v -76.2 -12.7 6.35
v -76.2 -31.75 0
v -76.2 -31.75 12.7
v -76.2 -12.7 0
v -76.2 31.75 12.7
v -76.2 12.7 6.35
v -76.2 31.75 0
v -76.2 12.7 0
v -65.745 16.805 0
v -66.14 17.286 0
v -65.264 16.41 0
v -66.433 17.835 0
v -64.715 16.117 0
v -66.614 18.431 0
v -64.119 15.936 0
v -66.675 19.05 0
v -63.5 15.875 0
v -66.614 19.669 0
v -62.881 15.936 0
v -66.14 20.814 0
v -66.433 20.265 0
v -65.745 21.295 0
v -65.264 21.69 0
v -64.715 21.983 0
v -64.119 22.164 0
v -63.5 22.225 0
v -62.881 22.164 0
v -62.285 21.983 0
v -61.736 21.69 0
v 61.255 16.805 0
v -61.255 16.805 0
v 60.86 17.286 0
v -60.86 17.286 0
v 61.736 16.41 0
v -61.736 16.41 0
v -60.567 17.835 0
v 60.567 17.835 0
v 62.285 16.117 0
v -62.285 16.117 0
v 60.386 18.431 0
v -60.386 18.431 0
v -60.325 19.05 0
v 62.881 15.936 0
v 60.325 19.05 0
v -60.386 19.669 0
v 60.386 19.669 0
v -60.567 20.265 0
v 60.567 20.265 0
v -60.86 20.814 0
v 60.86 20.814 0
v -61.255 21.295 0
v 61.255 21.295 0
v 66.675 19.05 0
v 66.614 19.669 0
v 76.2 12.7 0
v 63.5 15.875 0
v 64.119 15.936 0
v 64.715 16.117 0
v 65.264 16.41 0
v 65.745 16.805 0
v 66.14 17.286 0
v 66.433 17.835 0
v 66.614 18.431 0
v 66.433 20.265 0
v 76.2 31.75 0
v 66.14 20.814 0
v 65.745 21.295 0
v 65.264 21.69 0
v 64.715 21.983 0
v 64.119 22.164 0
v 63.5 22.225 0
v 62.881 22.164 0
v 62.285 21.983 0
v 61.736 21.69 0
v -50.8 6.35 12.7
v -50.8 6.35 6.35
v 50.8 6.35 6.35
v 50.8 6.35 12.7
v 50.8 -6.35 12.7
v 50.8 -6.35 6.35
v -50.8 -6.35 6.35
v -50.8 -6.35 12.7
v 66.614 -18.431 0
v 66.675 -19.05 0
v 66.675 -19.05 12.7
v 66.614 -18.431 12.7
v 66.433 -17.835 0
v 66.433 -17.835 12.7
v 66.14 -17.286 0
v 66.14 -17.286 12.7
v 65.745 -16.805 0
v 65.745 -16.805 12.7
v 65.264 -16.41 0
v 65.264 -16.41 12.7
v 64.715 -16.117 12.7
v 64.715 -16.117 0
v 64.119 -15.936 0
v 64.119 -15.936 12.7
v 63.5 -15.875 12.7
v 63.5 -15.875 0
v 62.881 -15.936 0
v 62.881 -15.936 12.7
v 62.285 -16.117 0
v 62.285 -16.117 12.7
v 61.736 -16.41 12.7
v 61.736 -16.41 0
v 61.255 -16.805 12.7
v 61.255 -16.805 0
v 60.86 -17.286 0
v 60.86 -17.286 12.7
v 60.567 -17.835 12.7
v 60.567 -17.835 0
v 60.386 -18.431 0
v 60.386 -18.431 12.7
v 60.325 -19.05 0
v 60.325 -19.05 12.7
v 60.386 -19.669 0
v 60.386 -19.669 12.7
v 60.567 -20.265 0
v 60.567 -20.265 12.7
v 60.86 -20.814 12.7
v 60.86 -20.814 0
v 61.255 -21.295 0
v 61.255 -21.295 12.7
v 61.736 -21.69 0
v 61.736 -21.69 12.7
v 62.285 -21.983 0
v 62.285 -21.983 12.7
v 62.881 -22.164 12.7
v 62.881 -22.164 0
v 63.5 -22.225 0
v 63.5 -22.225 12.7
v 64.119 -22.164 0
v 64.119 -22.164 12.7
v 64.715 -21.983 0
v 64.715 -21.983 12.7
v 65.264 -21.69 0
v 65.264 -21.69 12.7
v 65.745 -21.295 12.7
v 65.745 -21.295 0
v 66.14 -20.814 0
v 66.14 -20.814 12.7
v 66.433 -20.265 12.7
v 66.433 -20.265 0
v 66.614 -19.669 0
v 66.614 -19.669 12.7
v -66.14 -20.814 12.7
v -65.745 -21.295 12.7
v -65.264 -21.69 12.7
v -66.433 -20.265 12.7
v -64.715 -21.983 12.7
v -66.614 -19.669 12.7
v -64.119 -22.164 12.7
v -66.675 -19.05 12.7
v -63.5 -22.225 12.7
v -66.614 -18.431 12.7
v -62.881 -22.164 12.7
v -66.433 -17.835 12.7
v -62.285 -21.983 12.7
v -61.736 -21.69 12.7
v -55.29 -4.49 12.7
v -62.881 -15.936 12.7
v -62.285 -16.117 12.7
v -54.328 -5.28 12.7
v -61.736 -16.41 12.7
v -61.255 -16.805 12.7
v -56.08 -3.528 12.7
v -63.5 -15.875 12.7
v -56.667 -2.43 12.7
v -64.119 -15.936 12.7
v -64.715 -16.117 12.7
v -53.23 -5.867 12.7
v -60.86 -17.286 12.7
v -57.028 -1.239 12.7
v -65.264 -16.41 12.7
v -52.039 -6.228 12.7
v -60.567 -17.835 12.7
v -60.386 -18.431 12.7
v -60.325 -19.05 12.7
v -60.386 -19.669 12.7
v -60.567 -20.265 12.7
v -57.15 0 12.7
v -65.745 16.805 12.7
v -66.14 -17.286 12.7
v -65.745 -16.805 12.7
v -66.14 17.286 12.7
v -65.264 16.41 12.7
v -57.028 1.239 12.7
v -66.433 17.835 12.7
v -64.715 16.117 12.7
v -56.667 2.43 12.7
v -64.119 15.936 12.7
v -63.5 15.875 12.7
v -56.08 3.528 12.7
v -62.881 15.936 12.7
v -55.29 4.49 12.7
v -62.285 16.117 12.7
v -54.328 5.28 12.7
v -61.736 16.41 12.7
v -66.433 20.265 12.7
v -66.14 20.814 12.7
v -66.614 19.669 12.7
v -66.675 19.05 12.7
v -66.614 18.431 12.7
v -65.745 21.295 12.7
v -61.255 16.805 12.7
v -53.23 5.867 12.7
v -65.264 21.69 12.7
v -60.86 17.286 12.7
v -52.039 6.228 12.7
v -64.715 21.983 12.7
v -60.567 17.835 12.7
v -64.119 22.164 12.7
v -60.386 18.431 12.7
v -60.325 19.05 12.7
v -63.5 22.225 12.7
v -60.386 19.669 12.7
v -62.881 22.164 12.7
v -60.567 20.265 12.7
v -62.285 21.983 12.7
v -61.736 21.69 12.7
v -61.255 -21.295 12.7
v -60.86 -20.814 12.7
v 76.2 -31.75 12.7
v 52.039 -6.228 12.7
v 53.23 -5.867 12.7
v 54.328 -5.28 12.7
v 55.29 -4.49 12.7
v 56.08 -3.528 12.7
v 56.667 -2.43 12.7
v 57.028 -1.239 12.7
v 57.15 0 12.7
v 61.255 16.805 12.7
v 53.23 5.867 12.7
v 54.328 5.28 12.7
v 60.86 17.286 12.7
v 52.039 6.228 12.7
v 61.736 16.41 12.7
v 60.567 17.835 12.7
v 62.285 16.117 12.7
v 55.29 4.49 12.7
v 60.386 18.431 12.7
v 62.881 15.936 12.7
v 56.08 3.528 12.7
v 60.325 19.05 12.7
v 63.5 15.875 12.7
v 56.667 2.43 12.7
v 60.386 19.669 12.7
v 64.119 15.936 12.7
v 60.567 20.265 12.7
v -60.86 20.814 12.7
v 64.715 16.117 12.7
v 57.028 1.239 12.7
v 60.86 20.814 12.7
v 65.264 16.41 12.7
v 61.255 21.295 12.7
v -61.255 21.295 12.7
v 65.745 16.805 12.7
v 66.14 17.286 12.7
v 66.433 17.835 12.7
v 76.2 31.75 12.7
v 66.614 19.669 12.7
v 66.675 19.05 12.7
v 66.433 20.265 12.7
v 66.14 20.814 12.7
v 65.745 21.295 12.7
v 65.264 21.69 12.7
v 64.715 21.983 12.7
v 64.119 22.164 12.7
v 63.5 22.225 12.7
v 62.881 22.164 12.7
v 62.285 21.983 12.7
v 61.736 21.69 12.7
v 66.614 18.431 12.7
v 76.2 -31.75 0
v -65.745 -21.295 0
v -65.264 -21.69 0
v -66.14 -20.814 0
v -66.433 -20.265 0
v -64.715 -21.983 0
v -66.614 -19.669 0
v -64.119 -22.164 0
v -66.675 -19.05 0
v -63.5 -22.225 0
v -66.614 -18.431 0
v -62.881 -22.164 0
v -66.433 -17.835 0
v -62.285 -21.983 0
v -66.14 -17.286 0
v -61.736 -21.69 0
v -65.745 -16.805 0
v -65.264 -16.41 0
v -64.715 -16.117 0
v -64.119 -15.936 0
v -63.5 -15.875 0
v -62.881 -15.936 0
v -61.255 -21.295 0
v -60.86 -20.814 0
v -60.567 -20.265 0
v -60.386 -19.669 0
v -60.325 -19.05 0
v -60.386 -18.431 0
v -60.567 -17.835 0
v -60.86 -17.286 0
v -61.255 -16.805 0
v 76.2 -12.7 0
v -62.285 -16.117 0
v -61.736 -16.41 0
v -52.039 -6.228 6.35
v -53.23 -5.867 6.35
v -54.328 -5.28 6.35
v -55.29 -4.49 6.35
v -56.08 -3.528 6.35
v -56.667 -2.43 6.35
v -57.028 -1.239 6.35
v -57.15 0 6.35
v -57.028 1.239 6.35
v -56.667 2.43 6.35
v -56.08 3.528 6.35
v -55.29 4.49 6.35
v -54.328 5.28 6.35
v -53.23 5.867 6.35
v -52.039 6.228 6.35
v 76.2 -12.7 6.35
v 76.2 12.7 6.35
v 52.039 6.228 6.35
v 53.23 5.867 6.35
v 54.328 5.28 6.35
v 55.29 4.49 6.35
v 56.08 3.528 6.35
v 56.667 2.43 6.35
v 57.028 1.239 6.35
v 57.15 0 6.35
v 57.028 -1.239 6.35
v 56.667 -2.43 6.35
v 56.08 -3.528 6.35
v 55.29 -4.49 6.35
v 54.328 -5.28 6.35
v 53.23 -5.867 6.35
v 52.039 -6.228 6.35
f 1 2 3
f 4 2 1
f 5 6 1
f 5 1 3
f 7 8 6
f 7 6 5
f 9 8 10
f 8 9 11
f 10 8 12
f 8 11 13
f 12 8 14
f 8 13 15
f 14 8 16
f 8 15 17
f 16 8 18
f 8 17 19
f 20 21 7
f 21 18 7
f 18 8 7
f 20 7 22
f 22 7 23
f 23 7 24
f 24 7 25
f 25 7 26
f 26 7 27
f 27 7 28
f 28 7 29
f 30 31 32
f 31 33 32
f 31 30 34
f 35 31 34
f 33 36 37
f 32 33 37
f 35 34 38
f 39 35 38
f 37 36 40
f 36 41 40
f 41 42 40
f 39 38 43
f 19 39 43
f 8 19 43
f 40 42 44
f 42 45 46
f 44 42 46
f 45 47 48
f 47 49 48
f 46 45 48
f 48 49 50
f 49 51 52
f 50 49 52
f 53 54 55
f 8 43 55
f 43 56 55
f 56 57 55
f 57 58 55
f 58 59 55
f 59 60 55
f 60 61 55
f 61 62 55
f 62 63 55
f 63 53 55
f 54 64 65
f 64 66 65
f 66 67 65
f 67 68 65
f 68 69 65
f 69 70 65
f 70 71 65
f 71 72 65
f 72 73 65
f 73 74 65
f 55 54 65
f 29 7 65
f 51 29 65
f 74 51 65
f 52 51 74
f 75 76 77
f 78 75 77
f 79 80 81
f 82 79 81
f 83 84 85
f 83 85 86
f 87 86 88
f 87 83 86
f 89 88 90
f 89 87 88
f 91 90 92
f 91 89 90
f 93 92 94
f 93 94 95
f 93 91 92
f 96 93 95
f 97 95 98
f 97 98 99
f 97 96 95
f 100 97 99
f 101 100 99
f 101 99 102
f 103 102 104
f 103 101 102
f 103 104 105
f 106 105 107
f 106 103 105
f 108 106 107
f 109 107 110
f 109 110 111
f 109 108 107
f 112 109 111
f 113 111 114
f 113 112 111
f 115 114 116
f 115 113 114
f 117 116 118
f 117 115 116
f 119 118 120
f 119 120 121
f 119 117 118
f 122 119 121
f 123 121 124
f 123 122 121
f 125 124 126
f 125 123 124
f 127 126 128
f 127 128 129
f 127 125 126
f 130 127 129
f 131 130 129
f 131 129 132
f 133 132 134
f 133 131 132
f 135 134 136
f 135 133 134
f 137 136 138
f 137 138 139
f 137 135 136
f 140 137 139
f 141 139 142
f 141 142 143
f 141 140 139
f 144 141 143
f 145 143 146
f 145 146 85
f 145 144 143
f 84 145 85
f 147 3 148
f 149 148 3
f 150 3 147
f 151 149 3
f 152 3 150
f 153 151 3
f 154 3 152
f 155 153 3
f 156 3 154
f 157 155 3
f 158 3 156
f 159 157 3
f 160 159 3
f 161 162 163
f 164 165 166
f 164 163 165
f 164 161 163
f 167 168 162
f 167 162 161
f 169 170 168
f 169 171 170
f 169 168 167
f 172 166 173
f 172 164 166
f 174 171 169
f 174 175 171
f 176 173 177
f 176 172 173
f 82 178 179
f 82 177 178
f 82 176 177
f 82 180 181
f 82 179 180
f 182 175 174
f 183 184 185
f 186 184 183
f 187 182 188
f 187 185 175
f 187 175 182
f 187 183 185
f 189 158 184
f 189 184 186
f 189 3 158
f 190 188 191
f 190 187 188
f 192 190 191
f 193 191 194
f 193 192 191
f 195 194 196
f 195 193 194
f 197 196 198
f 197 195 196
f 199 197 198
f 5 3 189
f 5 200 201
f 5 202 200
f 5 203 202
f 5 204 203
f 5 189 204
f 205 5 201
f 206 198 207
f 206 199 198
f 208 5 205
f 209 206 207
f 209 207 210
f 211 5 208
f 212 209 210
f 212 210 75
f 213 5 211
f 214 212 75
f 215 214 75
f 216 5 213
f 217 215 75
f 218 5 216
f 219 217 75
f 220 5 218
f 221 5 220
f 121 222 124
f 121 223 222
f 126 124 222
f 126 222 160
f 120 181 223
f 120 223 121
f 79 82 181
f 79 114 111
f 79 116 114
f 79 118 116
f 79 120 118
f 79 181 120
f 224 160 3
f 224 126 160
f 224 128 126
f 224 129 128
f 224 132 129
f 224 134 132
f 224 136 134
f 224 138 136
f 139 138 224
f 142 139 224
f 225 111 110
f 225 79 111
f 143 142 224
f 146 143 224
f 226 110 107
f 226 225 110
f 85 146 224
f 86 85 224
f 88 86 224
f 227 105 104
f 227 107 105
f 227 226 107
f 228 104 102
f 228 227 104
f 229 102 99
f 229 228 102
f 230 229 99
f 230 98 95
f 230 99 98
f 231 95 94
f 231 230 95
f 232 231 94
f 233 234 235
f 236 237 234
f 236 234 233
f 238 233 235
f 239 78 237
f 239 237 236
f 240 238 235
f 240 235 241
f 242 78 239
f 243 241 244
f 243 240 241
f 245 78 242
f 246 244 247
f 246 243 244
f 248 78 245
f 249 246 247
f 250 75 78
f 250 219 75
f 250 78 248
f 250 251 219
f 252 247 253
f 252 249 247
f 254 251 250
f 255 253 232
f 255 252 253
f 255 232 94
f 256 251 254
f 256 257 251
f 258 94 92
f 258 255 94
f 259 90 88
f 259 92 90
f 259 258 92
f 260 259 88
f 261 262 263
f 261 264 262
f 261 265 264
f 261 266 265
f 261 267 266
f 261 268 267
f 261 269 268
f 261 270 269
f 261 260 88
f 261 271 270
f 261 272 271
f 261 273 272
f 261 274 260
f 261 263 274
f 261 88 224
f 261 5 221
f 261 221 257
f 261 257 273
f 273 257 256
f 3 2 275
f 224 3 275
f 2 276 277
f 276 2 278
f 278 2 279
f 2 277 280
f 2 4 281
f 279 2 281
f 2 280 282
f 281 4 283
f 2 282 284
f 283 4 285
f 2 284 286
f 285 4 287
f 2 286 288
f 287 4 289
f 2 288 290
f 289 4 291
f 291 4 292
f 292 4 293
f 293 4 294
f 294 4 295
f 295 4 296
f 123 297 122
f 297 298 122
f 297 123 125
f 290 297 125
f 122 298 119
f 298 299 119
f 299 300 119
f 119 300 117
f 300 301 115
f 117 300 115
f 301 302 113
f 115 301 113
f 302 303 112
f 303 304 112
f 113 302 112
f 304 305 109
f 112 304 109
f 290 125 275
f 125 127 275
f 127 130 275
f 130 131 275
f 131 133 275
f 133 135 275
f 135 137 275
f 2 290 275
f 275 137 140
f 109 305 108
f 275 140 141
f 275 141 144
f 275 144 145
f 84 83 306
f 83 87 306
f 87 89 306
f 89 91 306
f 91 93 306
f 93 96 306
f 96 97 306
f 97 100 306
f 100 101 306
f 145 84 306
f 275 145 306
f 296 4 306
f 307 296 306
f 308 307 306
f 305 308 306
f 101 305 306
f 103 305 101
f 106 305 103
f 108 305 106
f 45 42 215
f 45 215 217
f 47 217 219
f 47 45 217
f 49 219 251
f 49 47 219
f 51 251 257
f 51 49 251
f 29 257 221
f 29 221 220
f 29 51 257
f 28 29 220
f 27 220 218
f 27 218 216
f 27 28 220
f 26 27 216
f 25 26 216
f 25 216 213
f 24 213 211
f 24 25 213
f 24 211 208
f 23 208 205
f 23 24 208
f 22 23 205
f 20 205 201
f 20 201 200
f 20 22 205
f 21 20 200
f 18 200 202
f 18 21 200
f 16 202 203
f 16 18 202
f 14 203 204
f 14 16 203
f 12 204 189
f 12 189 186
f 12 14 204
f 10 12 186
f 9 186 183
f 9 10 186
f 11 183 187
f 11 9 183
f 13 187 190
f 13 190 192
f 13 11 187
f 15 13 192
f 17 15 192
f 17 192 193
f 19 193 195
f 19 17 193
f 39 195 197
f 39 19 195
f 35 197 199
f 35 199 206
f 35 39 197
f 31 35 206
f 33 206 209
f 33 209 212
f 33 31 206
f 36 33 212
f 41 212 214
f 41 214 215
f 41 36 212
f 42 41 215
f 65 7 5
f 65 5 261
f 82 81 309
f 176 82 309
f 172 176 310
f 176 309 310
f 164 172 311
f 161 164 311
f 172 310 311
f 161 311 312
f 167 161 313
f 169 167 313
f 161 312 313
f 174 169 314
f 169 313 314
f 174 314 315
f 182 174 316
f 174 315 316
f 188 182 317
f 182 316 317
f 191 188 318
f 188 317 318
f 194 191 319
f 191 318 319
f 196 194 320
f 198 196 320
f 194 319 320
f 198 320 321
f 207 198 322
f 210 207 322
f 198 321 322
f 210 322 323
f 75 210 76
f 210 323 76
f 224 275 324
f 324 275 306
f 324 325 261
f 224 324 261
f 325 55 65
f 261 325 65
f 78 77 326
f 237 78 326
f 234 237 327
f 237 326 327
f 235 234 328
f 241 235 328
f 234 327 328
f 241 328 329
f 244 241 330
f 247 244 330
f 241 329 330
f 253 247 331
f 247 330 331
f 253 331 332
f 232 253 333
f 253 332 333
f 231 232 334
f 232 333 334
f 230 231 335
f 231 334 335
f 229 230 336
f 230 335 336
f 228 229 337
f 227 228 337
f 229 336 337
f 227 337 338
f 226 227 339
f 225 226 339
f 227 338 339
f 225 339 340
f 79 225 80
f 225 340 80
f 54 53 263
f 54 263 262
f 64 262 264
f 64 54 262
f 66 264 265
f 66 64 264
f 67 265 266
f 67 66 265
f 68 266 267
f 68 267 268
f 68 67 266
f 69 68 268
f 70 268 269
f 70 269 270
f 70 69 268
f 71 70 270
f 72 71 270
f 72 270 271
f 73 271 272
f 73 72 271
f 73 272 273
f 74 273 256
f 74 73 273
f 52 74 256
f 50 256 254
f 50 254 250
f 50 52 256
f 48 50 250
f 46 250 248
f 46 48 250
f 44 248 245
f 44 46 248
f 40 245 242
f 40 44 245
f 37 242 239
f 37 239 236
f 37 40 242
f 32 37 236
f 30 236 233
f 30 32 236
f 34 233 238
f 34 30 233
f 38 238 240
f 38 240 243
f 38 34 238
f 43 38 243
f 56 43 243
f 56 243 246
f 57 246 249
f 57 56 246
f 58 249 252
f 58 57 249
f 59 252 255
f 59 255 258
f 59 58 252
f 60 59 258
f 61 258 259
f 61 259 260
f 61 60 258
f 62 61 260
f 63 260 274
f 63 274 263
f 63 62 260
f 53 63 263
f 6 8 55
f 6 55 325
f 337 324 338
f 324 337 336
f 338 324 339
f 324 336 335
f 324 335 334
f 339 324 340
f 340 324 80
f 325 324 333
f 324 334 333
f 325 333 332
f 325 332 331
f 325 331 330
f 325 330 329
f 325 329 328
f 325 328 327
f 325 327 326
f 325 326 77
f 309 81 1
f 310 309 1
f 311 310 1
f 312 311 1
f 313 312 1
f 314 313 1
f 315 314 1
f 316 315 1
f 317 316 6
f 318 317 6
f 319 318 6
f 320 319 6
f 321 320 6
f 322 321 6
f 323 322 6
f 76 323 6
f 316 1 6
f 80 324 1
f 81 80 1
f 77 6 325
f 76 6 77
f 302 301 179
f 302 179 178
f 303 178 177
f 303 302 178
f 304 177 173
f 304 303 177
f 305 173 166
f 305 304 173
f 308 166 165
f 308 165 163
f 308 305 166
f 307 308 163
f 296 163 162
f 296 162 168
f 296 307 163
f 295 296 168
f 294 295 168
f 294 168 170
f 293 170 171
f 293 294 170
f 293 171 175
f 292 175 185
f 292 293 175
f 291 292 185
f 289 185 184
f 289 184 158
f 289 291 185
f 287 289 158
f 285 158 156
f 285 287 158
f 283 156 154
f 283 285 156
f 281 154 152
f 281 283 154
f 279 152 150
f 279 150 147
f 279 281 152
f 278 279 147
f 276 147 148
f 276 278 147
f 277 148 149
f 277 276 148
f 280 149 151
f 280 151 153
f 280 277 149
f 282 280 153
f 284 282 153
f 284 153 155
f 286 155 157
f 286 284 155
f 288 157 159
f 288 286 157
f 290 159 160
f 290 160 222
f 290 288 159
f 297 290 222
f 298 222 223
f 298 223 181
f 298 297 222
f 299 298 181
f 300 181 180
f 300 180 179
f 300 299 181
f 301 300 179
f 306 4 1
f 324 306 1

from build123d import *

# Parameters (mm, degrees)
SKETCH1_W           = 152.4
SKETCH1_H           = 63.5
SKETCH1_R           = 3.175
BOSS_EXTRUDE1_DEPTH = 12.7
SKETCH2_W           = 12.7
SKETCH2_H           = 25.4
CUT_EXTRUDE1_DEPTH  = 153.4


with BuildPart() as part:
    # Sketch1 → Boss-Extrude1 (new body)
    with BuildSketch(Plane.XY):
        Rectangle(SKETCH1_W, SKETCH1_H)
        with Locations((-63.5, 19.05)):
            Circle(SKETCH1_R, mode=Mode.SUBTRACT)
        with Locations((63.5, 19.05)):
            Circle(SKETCH1_R, mode=Mode.SUBTRACT)
        with Locations((63.5, -19.05)):
            Circle(SKETCH1_R, mode=Mode.SUBTRACT)
        with Locations((-63.5, -19.05)):
            Circle(SKETCH1_R, mode=Mode.SUBTRACT)
        with BuildLine():
            Line((-50.8, 6.35), (50.8, 6.35))
            ThreePointArc((50.8, 6.35), (57.15, 0), (50.8, -6.35))
            Line((50.8, -6.35), (-50.8, -6.35))
            ThreePointArc((-50.8, -6.35), (-57.15, 0), (-50.8, 6.35))
        make_face(mode=Mode.SUBTRACT)
    extrude(amount=BOSS_EXTRUDE1_DEPTH)

    # Sketch2 → Cut-Extrude1 (cut, through all)
    with BuildSketch(Plane.ZY.offset(76.2)):
        Rectangle(SKETCH2_W, SKETCH2_H)
    extrude(amount=-CUT_EXTRUDE1_DEPTH, mode=Mode.SUBTRACT)


solid = part.part
